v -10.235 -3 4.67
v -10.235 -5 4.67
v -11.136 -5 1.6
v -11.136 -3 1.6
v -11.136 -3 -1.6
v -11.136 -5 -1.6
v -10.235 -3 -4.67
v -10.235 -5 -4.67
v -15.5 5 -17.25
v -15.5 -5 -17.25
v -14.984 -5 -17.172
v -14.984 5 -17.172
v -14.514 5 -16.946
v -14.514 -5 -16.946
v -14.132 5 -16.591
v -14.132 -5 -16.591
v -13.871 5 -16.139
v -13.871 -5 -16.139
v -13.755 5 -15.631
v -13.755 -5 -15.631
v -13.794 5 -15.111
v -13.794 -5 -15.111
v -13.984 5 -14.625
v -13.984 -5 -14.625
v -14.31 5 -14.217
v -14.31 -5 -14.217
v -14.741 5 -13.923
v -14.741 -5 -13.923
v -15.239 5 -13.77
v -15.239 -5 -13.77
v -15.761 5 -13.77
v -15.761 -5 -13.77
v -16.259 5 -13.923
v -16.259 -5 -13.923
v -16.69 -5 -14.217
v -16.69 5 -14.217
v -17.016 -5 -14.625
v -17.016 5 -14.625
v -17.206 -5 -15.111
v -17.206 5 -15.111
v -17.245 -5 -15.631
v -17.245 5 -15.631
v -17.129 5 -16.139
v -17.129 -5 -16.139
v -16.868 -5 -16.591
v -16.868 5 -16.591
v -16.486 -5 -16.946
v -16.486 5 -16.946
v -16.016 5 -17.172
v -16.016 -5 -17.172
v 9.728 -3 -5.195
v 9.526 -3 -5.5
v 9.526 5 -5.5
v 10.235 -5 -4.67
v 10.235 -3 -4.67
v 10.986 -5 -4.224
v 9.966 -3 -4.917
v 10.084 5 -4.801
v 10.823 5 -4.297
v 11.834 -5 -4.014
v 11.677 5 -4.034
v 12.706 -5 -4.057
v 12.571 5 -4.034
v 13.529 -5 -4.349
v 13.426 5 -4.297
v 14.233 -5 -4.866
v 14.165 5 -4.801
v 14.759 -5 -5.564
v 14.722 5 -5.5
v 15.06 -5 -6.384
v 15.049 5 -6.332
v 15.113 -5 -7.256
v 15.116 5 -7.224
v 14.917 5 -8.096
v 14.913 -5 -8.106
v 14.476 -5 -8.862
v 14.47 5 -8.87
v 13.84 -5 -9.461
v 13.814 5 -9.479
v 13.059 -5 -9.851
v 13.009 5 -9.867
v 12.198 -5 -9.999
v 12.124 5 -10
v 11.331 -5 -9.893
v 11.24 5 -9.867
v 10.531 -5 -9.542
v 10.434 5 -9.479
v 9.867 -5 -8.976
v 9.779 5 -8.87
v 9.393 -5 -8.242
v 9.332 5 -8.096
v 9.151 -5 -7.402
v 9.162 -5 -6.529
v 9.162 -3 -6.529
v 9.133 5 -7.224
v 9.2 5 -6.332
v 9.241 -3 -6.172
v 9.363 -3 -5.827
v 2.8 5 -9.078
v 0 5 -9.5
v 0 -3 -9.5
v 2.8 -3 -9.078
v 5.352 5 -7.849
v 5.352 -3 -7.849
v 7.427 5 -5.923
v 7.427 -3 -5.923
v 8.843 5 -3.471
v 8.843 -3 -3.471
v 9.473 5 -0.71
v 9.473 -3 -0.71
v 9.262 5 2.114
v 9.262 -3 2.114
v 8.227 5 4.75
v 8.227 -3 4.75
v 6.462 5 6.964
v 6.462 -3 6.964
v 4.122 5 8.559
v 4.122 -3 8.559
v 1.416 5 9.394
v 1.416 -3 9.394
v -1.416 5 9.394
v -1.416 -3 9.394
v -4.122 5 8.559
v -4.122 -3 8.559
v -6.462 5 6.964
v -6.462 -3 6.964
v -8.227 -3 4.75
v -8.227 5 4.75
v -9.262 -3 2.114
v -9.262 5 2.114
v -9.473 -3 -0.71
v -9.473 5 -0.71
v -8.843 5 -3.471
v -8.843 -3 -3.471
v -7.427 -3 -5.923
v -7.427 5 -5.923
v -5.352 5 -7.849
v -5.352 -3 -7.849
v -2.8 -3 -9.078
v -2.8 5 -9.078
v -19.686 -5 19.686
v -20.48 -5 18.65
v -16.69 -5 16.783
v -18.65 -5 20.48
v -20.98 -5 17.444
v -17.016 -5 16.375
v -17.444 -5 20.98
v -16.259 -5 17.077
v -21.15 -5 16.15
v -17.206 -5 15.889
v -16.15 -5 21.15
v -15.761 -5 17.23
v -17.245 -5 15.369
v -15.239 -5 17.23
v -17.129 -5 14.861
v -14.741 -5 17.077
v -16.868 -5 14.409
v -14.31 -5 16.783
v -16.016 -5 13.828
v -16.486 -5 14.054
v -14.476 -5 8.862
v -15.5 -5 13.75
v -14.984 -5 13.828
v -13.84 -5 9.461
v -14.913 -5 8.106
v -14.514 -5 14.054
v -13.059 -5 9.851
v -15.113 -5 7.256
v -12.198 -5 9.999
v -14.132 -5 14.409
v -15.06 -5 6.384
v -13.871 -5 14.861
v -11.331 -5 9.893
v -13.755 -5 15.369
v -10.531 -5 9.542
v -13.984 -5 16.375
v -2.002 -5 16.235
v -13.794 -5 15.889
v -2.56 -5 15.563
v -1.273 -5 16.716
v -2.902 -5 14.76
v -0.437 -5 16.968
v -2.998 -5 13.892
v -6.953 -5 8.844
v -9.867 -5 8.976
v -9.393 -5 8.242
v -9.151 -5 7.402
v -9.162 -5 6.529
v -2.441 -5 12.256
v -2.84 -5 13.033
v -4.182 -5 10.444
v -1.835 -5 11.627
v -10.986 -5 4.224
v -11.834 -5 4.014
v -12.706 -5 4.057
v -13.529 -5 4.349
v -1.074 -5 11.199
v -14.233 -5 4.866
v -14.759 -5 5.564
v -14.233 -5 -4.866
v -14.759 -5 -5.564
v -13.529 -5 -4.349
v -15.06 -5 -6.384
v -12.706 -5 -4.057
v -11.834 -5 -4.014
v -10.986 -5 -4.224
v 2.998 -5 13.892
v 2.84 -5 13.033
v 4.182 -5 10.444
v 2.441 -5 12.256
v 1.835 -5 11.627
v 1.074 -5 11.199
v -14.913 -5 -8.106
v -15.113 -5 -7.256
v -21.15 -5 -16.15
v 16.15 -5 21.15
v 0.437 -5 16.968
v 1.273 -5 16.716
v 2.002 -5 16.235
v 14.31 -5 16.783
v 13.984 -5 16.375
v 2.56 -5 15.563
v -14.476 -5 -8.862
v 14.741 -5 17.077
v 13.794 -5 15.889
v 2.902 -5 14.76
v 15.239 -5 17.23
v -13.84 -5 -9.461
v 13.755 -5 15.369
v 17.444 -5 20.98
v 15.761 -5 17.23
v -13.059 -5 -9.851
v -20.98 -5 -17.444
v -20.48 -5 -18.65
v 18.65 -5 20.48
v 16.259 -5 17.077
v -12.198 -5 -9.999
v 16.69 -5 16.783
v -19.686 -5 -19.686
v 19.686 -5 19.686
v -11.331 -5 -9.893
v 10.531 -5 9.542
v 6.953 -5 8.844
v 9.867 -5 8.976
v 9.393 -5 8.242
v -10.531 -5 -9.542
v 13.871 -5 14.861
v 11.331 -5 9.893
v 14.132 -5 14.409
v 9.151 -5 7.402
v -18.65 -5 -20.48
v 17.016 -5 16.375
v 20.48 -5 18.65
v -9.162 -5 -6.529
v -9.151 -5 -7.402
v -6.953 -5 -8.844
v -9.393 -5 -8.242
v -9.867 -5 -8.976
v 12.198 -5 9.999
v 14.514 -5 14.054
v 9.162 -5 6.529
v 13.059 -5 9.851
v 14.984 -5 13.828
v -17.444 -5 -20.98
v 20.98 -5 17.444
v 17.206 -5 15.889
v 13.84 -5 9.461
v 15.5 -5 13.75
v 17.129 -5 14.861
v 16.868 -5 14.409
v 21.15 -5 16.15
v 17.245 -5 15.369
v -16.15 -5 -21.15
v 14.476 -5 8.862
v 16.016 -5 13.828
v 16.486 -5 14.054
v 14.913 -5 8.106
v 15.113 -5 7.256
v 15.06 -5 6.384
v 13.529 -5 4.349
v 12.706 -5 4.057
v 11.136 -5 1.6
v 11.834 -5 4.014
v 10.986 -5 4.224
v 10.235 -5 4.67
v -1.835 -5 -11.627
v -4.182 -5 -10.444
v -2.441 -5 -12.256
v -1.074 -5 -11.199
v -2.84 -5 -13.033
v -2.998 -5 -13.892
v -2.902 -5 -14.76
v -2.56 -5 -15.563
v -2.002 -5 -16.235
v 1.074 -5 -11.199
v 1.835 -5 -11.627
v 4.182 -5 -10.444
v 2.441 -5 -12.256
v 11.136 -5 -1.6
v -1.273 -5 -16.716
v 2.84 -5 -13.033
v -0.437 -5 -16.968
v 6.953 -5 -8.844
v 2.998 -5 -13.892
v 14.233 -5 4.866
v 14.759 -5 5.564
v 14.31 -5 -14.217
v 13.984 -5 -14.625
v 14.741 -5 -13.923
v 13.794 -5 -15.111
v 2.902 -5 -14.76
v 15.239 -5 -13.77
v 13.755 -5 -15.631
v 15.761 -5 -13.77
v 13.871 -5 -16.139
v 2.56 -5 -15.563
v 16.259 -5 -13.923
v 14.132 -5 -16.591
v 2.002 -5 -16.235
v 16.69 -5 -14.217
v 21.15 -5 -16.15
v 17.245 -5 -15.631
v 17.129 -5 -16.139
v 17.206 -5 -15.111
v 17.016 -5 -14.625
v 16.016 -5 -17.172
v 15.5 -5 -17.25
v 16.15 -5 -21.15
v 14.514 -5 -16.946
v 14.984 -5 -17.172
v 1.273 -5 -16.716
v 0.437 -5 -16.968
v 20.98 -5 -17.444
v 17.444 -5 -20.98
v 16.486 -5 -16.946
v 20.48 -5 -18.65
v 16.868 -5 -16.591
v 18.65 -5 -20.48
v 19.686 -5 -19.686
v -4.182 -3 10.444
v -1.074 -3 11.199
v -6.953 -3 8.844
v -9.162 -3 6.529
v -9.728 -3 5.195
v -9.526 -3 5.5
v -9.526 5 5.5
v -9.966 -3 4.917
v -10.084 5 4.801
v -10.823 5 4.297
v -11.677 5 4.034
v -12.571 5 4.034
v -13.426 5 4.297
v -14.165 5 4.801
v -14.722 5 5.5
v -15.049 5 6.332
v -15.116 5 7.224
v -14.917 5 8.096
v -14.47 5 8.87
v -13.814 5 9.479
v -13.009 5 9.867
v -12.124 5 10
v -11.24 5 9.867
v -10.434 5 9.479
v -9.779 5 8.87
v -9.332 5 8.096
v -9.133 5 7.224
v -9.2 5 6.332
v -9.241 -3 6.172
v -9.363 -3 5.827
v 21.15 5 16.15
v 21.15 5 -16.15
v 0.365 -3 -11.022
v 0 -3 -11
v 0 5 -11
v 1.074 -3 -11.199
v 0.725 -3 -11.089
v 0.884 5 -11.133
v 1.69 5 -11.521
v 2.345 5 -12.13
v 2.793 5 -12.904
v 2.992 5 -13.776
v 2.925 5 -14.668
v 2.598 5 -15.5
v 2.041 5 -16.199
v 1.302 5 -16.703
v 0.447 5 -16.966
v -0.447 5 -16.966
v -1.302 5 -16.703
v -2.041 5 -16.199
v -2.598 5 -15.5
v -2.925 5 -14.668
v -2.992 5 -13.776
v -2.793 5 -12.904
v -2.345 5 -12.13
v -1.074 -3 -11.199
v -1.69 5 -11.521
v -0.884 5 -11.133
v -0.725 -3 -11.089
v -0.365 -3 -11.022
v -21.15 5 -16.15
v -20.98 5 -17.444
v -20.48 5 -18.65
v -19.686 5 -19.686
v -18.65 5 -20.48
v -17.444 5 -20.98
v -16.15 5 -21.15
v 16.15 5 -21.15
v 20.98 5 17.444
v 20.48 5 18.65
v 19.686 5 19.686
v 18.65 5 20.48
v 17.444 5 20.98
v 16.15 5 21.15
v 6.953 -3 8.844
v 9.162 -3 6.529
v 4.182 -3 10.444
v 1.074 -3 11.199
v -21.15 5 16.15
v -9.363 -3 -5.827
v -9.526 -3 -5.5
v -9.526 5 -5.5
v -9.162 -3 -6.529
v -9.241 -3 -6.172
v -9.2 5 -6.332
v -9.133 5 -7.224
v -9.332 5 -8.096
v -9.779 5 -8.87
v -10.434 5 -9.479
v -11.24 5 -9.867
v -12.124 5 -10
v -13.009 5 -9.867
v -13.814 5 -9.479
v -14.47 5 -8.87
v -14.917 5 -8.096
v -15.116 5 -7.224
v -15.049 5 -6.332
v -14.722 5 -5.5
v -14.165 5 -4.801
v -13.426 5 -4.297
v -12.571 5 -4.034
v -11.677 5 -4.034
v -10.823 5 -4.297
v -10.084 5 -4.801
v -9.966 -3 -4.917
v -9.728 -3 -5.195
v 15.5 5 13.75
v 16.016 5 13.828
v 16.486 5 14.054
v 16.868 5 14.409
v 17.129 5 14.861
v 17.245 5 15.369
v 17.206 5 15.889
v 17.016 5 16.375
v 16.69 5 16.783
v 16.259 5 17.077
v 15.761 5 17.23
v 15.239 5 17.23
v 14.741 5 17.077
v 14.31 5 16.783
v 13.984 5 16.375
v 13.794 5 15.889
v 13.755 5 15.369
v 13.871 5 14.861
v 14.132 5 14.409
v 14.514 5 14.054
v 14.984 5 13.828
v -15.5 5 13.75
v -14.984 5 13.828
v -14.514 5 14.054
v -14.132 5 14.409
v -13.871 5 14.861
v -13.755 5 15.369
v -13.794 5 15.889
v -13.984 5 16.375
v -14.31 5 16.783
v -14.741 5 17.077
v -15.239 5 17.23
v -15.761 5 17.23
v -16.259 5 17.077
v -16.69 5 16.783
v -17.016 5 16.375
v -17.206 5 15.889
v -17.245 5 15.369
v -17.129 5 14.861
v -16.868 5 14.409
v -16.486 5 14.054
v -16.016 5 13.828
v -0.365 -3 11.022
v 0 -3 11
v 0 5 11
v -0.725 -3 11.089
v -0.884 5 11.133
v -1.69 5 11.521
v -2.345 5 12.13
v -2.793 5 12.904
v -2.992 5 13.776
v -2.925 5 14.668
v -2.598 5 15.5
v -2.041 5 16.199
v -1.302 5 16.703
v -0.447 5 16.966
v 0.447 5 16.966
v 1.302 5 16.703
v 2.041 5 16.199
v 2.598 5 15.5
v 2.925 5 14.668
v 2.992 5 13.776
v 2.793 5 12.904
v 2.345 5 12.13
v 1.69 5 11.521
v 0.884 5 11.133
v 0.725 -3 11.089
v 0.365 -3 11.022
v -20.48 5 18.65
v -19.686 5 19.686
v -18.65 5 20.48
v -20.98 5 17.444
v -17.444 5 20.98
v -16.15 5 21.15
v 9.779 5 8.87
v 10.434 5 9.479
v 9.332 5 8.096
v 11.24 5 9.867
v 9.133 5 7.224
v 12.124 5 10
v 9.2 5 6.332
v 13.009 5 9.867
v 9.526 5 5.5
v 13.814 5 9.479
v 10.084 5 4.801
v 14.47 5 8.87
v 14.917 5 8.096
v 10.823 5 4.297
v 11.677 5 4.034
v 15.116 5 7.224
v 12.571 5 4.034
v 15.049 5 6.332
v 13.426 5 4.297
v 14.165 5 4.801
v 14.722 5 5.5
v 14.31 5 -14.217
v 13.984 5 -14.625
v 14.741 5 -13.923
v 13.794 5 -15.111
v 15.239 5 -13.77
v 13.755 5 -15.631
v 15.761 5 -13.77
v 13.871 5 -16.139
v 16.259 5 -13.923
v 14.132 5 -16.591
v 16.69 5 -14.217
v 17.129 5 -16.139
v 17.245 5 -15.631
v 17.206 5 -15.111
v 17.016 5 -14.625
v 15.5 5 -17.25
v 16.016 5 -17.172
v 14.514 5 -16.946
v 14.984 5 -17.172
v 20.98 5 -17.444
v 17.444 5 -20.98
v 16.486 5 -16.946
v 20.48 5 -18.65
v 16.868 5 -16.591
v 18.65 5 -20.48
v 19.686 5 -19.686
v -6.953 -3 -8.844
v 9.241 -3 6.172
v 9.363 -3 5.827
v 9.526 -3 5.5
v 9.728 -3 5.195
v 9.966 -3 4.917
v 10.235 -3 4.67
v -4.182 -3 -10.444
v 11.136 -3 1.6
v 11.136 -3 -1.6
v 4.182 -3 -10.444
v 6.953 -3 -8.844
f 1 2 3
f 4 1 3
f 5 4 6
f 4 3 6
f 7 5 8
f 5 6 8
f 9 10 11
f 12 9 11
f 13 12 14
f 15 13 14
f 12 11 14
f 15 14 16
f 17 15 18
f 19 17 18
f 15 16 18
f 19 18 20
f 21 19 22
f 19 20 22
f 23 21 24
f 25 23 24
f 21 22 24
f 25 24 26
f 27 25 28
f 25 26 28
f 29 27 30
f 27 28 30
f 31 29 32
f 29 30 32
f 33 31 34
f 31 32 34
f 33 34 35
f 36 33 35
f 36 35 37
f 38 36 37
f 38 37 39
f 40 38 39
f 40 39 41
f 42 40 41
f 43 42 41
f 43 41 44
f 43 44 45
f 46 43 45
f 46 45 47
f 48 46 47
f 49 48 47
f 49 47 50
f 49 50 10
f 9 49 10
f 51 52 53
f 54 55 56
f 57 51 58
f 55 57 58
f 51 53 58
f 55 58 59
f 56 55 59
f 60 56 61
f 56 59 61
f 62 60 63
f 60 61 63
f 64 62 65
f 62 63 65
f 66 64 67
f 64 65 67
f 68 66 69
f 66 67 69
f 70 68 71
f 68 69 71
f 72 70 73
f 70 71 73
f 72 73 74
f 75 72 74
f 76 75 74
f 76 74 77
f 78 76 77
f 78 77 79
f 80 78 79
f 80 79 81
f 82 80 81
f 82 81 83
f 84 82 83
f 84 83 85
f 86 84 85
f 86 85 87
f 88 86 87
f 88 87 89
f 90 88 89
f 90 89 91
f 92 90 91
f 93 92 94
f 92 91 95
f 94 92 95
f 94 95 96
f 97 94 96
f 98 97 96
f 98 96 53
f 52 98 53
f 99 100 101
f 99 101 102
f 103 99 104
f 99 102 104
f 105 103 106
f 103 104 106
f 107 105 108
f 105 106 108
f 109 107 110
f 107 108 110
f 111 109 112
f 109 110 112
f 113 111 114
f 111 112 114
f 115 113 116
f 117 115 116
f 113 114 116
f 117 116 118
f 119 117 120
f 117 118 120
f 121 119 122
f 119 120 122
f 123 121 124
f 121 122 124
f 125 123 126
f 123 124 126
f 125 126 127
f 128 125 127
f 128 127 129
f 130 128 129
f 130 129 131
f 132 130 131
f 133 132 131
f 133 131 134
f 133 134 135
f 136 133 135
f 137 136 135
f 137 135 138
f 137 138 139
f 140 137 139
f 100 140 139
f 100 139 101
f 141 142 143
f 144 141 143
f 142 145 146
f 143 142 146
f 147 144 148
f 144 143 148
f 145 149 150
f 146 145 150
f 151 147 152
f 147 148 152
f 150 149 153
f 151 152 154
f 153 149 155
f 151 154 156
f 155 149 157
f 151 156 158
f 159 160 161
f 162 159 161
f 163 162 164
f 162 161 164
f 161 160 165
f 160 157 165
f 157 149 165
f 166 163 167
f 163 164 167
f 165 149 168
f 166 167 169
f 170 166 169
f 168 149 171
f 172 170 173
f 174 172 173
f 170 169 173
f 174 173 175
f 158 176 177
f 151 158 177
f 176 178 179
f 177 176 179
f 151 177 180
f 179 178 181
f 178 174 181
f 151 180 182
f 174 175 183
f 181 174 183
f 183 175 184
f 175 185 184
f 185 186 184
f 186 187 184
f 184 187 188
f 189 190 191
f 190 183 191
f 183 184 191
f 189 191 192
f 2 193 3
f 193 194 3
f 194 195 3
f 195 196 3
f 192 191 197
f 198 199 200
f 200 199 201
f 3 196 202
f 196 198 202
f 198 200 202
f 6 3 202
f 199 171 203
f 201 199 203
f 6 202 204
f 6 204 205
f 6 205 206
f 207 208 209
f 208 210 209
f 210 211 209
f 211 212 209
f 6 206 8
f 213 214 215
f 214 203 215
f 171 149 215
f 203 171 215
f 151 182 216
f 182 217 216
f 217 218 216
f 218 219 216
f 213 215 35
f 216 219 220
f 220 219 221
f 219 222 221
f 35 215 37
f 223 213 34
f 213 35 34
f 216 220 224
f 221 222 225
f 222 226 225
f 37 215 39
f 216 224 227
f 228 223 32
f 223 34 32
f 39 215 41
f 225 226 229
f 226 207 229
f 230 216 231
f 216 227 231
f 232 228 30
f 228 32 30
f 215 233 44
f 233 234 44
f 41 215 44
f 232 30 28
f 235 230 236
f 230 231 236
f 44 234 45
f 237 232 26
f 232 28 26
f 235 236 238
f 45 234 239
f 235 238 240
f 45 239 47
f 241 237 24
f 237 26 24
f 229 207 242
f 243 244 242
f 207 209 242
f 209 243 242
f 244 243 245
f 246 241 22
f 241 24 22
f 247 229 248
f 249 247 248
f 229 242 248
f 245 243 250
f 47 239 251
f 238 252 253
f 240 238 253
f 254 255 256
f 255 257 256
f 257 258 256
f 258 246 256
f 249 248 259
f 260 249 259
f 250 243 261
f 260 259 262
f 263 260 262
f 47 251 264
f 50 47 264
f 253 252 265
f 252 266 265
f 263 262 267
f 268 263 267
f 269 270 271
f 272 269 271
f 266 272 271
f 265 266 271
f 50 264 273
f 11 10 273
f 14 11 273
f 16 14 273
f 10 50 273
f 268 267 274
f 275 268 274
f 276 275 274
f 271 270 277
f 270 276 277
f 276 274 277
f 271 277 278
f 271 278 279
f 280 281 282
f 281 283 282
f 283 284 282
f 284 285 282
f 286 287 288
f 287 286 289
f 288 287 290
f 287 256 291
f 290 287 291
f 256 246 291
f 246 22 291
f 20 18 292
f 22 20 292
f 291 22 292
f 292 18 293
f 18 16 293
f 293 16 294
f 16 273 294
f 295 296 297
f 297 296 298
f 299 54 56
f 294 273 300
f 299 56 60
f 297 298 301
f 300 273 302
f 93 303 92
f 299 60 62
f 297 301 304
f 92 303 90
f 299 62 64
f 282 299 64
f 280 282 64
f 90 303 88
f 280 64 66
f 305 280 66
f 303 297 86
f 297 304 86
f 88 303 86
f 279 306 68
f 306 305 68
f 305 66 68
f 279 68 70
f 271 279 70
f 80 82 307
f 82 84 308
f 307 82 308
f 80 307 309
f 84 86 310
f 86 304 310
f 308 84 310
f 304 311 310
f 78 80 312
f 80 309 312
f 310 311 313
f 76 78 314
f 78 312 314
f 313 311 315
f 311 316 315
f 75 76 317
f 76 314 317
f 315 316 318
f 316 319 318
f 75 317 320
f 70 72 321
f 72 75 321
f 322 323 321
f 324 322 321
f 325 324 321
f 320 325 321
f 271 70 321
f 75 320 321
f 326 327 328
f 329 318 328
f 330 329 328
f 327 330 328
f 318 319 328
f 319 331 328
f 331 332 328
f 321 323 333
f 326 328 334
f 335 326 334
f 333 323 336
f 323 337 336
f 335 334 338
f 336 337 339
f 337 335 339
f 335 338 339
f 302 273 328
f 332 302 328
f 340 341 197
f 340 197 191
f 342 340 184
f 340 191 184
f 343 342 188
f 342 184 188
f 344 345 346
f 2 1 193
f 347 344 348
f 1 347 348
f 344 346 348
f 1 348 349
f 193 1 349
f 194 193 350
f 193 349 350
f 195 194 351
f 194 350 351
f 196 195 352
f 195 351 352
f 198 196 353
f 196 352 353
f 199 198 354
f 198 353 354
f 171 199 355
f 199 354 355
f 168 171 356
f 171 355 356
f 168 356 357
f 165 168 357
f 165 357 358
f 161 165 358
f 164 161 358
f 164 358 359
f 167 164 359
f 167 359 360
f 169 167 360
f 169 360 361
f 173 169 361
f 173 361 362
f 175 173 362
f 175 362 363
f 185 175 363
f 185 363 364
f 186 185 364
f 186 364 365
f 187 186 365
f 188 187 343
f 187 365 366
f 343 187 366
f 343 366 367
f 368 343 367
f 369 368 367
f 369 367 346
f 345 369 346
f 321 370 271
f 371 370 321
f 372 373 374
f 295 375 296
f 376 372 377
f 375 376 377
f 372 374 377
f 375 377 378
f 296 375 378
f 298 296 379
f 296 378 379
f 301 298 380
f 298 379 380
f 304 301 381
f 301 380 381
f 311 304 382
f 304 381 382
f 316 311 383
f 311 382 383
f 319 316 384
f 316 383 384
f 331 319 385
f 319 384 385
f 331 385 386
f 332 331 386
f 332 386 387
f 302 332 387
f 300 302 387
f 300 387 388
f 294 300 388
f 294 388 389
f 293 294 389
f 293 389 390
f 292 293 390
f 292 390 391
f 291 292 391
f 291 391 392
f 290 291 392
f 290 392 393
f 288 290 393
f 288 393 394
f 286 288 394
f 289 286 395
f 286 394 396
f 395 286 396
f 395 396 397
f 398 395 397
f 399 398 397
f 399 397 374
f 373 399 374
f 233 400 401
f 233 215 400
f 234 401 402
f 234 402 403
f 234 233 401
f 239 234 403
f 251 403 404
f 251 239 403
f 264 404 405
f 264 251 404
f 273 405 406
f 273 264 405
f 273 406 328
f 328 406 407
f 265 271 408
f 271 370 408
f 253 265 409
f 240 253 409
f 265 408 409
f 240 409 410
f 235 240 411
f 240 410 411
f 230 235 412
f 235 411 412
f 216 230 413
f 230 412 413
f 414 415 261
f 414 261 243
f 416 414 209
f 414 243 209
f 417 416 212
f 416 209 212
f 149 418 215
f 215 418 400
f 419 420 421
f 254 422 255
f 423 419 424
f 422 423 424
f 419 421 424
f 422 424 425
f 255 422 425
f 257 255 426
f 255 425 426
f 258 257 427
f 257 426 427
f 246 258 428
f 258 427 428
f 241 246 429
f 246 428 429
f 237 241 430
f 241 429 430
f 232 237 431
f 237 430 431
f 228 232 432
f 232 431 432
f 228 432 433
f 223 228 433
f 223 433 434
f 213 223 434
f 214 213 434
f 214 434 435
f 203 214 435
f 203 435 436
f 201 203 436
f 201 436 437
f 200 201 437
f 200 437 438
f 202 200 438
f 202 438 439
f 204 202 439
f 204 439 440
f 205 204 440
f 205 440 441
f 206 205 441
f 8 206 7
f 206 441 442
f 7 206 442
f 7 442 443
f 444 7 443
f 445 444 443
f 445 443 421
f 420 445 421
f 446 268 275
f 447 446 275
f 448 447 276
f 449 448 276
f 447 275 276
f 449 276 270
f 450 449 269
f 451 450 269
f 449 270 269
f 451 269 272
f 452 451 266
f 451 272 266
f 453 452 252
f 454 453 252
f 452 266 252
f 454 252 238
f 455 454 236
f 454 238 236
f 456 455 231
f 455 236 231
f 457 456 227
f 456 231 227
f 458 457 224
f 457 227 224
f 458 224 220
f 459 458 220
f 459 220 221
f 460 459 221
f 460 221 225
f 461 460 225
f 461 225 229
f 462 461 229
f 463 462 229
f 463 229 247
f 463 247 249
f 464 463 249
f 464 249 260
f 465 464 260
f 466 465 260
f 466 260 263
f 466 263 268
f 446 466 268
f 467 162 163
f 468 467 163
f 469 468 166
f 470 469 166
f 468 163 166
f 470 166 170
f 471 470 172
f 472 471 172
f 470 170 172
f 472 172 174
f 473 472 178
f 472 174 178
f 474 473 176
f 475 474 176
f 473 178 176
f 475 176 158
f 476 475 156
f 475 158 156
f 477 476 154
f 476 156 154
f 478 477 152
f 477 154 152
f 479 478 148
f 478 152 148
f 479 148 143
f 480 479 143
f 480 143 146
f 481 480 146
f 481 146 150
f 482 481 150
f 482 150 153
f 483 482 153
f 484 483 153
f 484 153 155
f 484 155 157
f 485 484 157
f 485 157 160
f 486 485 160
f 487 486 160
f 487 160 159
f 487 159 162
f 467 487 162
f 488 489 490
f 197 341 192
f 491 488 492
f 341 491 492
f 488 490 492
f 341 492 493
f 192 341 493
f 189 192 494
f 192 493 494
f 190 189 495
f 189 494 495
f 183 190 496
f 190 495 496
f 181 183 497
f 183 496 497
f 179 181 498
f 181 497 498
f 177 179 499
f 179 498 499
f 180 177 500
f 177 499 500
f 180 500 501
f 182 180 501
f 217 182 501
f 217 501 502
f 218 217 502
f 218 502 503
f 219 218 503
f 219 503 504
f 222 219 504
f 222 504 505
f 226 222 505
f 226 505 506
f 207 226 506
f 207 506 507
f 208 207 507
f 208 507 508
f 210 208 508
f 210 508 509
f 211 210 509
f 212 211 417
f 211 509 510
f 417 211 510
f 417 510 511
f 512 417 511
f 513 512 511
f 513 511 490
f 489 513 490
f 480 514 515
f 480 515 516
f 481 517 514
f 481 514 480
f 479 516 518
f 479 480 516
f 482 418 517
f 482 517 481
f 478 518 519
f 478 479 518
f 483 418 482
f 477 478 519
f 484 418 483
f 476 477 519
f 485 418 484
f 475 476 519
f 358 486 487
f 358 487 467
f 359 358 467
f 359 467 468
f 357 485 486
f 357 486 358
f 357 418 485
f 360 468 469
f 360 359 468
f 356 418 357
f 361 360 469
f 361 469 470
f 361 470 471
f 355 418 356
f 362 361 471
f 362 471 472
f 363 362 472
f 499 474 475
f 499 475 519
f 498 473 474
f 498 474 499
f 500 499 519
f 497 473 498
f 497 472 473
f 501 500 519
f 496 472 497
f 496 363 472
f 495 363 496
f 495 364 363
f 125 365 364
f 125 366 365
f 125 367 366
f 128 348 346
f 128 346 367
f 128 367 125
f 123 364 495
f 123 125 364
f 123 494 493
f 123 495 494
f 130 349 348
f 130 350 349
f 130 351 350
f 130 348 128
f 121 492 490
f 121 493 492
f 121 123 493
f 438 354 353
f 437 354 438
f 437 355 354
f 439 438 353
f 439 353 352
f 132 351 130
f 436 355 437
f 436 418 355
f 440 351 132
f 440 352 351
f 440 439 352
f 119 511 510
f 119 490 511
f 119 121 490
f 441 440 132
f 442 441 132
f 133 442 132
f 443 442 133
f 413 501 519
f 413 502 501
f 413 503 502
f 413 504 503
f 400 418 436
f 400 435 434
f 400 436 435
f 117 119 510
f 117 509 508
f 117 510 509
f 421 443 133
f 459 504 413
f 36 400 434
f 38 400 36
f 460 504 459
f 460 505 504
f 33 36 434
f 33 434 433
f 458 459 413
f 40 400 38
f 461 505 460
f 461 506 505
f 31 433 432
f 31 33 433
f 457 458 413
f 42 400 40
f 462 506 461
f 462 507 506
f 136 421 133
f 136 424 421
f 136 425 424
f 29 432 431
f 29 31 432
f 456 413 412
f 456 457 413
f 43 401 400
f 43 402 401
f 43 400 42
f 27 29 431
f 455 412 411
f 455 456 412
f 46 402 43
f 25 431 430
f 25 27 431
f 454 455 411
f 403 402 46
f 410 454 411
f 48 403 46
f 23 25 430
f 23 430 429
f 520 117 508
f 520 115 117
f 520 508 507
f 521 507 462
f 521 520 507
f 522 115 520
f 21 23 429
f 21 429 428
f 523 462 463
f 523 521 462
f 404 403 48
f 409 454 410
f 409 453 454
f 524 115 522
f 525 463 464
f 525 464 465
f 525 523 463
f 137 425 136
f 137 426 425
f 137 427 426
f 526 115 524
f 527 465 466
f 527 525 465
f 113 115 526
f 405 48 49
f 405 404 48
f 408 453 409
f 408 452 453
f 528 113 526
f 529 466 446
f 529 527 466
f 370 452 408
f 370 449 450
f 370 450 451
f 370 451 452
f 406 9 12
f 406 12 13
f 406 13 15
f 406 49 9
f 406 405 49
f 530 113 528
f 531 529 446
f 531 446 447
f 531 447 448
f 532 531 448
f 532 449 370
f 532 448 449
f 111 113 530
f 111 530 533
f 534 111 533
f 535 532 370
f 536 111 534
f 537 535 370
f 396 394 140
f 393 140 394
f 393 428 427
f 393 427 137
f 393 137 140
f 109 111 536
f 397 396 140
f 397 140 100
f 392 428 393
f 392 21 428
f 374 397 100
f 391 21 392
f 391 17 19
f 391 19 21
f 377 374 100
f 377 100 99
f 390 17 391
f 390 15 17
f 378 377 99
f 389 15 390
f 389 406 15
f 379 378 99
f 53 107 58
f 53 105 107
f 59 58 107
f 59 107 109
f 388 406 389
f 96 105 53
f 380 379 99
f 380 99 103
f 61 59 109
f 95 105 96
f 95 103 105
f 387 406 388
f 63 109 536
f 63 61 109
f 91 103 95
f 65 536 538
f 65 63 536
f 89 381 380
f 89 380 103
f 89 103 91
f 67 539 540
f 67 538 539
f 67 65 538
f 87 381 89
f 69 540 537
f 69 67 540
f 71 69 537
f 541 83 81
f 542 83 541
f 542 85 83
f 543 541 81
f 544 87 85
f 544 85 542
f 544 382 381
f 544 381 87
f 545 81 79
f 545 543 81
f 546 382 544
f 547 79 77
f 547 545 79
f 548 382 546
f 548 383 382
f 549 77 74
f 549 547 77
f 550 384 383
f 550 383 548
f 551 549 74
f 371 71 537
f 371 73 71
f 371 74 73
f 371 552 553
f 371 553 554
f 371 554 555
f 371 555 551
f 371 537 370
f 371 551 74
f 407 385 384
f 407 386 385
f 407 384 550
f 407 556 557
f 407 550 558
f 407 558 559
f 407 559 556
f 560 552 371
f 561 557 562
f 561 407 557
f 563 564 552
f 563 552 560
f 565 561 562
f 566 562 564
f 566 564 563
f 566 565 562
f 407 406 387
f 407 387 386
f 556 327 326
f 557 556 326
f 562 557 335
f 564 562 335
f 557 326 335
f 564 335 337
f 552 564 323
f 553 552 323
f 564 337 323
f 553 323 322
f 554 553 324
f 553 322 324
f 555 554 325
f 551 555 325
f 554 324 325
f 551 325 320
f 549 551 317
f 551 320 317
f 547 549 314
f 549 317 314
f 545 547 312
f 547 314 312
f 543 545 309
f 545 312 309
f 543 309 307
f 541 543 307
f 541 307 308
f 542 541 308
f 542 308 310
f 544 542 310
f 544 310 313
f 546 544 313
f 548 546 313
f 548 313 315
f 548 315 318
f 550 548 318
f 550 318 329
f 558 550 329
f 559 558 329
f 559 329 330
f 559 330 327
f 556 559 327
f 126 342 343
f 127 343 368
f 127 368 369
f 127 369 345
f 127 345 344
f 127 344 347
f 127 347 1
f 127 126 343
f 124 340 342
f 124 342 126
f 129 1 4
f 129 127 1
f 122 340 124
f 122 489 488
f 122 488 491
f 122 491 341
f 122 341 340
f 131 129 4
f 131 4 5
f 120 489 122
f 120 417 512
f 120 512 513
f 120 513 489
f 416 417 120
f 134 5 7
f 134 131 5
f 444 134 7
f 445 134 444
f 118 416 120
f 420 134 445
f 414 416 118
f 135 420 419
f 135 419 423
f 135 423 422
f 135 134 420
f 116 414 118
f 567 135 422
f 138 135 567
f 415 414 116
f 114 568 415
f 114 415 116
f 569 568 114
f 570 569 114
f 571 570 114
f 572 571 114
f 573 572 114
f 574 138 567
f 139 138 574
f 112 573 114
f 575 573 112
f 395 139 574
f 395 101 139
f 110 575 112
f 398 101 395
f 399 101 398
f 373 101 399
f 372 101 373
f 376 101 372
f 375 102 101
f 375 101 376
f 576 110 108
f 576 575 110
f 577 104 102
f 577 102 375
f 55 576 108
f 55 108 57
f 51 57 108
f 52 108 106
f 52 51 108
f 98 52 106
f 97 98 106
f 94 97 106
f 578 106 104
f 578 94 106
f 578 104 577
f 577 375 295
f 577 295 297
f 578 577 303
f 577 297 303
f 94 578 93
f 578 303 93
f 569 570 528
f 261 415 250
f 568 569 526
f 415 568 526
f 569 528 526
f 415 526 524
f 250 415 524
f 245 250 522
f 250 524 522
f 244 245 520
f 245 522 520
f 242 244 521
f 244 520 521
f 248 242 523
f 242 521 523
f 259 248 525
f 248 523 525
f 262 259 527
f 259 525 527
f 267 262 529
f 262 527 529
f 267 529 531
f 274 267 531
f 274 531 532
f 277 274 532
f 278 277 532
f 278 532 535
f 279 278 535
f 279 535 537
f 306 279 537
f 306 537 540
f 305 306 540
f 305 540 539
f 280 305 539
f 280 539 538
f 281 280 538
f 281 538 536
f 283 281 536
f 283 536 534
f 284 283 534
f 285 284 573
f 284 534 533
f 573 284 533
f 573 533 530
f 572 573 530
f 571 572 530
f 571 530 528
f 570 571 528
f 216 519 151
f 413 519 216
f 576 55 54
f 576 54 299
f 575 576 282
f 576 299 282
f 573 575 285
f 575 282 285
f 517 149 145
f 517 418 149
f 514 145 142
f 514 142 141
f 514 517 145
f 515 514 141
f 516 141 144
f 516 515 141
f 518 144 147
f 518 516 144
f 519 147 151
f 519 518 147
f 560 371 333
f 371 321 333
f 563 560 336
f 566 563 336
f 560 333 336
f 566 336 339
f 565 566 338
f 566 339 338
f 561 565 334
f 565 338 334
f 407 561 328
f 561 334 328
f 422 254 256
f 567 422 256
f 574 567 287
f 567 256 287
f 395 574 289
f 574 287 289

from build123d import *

# Parameters (mm, degrees)
SKETCH1_W           = 42.3
SKETCH1_H           = 42.3
BOSS_EXTRUDE1_DEPTH = 5
FILLET1_R           = 5
SKETCH2_R           = 1.75
CUT_EXTRUDE1_DEPTH  = 32.537992961
SKETCH3_R           = 11.25
CUT_EXTRUDE2_DEPTH  = 2
SKETCH4_R           = 9.5
CUT_EXTRUDE3_DEPTH  = 31.96199283
SKETCH5_R           = 3
CUT_EXTRUDE4_DEPTH  = 32.537992961
CIRPATTERN1_COUNT   = 6


with BuildPart() as part:
    # Sketch1 → Boss-Extrude1 (new, symmetric)
    with BuildSketch(Plane(origin=(0, 0, 0), x_dir=(1, 0, 0), z_dir=(0, 1, 0))):
        Rectangle(SKETCH1_W, SKETCH1_H)
    extrude(amount=BOSS_EXTRUDE1_DEPTH, both=True)

    # Fillet1
    fillet1_edges = [part.edges().sort_by_distance(p)[0] for p in [
        (21.15, 0, 21.15),
        (-21.15, 0, 21.15),
        (-21.15, 0, -21.15),
        (21.15, 0, -21.15),
    ]]
    fillet(fillet1_edges, radius=FILLET1_R)

    # Sketch2 → Cut-Extrude1 (cut, through all)
    with BuildSketch(Plane.XZ.offset(5)):
        with Locations(Location((-15.5, 15.5, 0), (0, 0, 270))):
            Circle(SKETCH2_R)
        with Locations(Location((15.5, 15.5, 0), (0, 0, 270))):
            Circle(SKETCH2_R)
        with Locations(Location((15.5, -15.5, 0), (0, 0, 270))):
            Circle(SKETCH2_R)
        with Locations(Location((-15.5, -15.5, 0), (0, 0, 270))):
            Circle(SKETCH2_R)
    extrude(amount=-CUT_EXTRUDE1_DEPTH, mode=Mode.SUBTRACT)

    # Sketch3 → Cut-Extrude2 (cut)
    with BuildSketch(Plane.XZ.offset(5)):
        with Locations(Location((0, 0, 0), (0, 0, 270))):
            Circle(SKETCH3_R)
    extrude(amount=-CUT_EXTRUDE2_DEPTH, mode=Mode.SUBTRACT)

    # Sketch4 → Cut-Extrude3 (cut, through all)
    with BuildSketch(Plane.XZ.offset(3)):
        with Locations(Location((0, 0, 0), (0, 0, 270))):
            Circle(SKETCH4_R)
    extrude(amount=-CUT_EXTRUDE3_DEPTH, mode=Mode.SUBTRACT)

    # Sketch5 → Cut-Extrude4 (cut, through all)
    with BuildSketch(Plane(origin=(0, 5, 0), x_dir=(1, 0, 0), z_dir=(0, 1, 0))):
        with Locations(Location((0, 14, 0), (0, 0, 270))):
            Circle(SKETCH5_R)
    cut_extrude4 = extrude(amount=-CUT_EXTRUDE4_DEPTH, mode=Mode.SUBTRACT)

    # CirPattern1: Cut-Extrude4 ×6 about axis
    cirpattern1_axis = Axis((0, 0, 0), (0, 1, 0))
    for i in range(1, CIRPATTERN1_COUNT):
        add(cut_extrude4.rotate(cirpattern1_axis, i * 360 / CIRPATTERN1_COUNT), mode=Mode.SUBTRACT)


solid = part.part
